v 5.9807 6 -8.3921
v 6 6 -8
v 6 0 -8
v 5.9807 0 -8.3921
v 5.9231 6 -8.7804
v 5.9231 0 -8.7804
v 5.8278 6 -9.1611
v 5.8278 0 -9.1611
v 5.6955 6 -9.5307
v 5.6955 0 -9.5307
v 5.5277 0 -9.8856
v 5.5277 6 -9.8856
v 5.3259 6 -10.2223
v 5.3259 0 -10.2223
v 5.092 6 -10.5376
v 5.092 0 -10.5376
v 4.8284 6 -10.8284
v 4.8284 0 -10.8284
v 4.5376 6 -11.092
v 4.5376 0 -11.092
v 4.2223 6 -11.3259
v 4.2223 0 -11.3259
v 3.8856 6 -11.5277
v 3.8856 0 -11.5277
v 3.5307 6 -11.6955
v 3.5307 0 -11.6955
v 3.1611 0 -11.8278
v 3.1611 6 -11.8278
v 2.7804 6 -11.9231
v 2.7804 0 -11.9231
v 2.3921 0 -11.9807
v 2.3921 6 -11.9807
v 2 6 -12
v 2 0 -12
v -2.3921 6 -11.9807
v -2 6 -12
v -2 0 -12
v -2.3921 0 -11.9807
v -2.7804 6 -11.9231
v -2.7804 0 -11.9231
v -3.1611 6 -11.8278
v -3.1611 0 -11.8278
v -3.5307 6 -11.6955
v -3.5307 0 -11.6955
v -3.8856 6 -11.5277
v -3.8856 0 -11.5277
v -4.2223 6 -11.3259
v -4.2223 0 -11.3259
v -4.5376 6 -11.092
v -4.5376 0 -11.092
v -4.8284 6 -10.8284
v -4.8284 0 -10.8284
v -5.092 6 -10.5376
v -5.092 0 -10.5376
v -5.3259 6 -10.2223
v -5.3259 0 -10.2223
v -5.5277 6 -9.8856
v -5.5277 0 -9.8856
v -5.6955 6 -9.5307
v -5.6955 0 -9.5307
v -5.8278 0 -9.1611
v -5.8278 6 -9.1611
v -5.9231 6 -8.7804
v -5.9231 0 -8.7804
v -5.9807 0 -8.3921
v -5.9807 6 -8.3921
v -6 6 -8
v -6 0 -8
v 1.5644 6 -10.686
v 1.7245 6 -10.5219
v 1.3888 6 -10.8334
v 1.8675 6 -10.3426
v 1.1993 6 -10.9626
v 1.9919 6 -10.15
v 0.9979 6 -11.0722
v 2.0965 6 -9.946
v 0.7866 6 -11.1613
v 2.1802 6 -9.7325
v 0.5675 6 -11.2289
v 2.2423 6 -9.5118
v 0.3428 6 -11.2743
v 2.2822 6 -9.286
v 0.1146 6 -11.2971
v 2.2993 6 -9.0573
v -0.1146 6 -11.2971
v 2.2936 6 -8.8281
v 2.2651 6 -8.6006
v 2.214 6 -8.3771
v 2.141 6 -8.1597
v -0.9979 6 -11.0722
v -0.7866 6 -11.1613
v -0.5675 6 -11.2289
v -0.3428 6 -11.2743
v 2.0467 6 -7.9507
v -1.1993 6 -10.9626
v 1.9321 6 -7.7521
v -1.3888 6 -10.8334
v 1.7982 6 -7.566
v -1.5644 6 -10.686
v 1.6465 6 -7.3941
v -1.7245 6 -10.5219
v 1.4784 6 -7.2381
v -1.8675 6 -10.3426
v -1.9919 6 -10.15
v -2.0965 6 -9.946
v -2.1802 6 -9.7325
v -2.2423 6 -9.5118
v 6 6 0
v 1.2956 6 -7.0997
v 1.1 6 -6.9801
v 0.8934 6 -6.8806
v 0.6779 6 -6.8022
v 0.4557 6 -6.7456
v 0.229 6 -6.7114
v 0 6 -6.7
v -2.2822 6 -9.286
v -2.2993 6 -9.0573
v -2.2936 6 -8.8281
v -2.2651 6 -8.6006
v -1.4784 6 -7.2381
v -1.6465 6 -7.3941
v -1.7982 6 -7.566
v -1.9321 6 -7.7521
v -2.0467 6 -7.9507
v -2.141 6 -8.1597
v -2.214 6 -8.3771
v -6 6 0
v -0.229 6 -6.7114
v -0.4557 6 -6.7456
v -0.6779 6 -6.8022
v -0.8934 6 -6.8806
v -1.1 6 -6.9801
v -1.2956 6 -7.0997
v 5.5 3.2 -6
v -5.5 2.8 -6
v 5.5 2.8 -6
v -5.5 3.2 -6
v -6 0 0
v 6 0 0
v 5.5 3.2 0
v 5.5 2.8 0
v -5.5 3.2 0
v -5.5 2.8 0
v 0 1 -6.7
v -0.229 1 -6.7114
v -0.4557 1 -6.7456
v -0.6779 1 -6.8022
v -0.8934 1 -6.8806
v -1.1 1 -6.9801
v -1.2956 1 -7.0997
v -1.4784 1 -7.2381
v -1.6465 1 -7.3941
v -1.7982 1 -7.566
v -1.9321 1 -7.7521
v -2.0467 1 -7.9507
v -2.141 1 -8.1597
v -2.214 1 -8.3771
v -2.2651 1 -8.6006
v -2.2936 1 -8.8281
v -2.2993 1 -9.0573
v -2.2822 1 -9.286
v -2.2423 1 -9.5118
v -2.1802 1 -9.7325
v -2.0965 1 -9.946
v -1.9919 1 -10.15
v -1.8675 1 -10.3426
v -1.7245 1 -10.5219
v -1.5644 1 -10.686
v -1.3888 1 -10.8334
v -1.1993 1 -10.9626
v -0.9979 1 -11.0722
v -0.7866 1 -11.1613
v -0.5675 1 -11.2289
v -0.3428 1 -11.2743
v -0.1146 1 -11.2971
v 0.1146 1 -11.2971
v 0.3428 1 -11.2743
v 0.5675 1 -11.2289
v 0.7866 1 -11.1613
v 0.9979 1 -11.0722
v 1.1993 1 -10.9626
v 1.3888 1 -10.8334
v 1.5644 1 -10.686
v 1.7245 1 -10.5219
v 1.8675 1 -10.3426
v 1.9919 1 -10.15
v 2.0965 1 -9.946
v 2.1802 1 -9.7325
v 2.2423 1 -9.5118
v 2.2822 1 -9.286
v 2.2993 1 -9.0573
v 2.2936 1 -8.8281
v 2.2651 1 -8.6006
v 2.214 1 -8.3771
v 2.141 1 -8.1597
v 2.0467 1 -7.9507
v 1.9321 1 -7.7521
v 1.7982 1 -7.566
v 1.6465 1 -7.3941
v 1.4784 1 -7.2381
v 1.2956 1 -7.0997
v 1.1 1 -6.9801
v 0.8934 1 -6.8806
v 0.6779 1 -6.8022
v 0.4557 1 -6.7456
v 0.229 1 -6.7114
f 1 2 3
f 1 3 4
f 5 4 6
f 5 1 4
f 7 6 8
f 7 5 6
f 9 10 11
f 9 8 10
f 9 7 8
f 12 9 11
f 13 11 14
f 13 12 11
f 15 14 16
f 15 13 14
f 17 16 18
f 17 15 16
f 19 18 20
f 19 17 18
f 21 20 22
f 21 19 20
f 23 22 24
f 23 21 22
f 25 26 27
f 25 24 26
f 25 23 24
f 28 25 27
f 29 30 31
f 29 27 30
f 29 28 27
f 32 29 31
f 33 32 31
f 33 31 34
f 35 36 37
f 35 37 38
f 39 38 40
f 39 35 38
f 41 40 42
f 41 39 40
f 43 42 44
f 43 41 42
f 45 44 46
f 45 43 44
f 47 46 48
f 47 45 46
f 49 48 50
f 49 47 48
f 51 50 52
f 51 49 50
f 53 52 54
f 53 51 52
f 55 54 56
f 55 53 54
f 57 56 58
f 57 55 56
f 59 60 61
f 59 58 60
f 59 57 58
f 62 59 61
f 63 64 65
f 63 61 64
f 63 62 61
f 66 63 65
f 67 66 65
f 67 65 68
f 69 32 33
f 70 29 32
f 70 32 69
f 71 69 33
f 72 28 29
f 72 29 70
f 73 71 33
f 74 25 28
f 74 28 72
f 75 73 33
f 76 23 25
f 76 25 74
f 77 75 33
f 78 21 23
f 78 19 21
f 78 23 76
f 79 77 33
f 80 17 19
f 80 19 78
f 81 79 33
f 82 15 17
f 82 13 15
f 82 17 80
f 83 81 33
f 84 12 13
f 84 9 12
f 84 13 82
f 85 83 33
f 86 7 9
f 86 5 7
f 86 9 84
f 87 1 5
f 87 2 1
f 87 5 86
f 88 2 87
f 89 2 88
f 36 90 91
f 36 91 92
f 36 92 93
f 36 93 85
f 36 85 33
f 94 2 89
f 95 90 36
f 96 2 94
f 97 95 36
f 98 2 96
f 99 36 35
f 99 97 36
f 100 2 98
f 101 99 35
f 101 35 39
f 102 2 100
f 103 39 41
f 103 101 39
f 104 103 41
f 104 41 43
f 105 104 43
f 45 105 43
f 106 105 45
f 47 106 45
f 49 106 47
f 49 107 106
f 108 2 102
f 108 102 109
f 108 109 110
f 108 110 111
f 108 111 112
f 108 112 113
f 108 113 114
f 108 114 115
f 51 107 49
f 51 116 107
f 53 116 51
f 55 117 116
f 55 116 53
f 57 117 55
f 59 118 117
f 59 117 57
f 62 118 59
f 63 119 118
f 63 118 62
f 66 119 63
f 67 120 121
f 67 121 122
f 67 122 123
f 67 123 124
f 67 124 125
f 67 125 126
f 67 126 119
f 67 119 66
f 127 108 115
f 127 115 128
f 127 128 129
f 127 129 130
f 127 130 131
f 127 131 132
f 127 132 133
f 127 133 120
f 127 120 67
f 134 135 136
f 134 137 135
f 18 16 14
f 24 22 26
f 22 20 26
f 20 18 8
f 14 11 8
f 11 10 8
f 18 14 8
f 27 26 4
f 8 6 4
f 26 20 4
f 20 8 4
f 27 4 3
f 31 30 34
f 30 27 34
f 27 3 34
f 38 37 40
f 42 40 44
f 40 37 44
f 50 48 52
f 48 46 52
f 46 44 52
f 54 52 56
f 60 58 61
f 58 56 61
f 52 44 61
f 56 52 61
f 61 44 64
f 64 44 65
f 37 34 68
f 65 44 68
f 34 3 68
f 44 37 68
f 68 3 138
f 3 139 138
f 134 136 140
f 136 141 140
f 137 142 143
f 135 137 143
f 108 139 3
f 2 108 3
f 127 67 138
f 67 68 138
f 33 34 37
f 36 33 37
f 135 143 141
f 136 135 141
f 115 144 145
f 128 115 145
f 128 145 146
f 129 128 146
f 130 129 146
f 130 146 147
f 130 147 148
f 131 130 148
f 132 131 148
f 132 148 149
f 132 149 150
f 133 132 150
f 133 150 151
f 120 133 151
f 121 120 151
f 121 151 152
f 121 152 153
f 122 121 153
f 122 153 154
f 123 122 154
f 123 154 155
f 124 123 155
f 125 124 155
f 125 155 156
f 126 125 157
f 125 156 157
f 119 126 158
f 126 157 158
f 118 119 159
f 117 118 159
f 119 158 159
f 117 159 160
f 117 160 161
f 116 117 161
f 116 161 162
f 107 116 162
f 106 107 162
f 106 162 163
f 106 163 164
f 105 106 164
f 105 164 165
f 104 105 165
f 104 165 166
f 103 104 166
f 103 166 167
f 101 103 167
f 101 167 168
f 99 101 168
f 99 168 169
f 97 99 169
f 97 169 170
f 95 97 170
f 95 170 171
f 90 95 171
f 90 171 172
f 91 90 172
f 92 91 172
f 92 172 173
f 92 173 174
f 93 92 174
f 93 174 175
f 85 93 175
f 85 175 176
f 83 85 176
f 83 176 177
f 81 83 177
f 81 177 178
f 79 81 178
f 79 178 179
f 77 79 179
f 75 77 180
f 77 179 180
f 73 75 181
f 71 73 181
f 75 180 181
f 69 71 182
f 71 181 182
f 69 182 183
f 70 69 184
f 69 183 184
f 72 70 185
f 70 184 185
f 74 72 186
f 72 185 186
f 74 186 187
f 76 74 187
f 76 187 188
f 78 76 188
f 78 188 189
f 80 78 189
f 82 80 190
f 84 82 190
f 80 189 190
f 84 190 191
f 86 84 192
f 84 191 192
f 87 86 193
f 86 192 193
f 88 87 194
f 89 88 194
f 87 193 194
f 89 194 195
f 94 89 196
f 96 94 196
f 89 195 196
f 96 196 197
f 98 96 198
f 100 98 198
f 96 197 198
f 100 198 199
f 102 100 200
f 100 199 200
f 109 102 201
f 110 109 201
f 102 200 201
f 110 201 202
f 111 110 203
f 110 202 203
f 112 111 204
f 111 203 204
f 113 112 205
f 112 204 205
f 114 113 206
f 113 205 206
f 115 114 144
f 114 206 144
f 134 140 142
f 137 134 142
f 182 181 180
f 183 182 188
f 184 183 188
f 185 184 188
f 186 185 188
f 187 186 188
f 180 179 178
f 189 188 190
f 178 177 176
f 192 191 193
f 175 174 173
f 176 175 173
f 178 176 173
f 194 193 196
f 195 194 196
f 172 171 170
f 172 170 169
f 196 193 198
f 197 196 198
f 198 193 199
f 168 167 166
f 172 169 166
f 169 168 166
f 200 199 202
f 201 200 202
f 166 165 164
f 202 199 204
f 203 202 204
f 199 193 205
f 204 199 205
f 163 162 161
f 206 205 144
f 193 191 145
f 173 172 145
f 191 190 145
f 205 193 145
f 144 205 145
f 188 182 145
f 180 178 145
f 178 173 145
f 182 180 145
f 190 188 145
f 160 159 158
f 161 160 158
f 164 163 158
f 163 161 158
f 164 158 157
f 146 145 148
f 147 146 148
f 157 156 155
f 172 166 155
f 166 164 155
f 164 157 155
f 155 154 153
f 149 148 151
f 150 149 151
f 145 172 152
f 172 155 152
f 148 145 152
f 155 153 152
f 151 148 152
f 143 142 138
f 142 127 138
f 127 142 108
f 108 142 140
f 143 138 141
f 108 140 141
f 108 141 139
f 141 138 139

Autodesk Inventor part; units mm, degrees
ref_plane "YZ Plane" through (0, 0, 0) normal (1, 0, 0) x (0, 1, 0)
ref_plane "XZ Plane" through (0, 0, 0) normal (0, 1, 0) x (-1, 0, 0)
ref_plane "XY Plane" through (0, 0, 0) normal (0, 0, 1) x (1, 0, 0)
sketch "Sketch1" plane through (0, 0, 0) normal (0, 1, 0) x (-1, 0, 0)
  line L0 (6, 0) -> (-6, 0)
  line L1 (-6, 0) -> (-6, -12)
  line L2 (-6, -12) -> (6, -12)
  line L3 (6, -12) -> (6, 0)
  point P0 (0, 0)
  point P1 (0, 0)
  dimension "d0" = 12
  dimension "d1" = 12
extrude "Extrusion1" add sketch "Sketch1" along normal blind 6
sketch "Sketch2" plane through (0, 6, 0) normal (0, 1, 0) x (1, 0, 0)
  line L0 (6, 12) -> (-6, 12) projected
  line L1 (-6, 0) -> (6, 0) projected
  point P0 (0, 0)
  point P1 (0, 9)
  point P2 (0, 0)
  dimension "d4" = 3
hole "Hole1" at (0, 6, -9) direction (0, -1, 0) diameter 4.6 depth 5
fillet "Fillet1" radius 4 2 edges at (-6, 3, -12) (6, 3, -12)
sketch "Sketch3" plane through (-6, 0, 0) normal (0, 0, 1) x (1, 0, 0)
  line L0 (0.5, 2.8) -> (11.5, 2.8)
  line L1 (11.5, 2.8) -> (11.5, 3.2)
  line L2 (11.5, 3.2) -> (0.5, 3.2)
  line L3 (0.5, 3.2) -> (0.5, 2.8)
  line L4 (0, 0) -> (12, 0) projected
  line L5 (0, 0) -> (0, 6) projected
  point P0 (6, 0)
  point P1 (6, 2.8)
  point P2 (6, 0)
  point P3 (0.5, 3)
  point P4 (0, 3)
  dimension "d13" = 0.4
  dimension "d14" = 11
extrude "Extrusion2" cut sketch "Sketch3" against normal blind 6
properties part number "AUfsatz" material "ABS Plastic"
